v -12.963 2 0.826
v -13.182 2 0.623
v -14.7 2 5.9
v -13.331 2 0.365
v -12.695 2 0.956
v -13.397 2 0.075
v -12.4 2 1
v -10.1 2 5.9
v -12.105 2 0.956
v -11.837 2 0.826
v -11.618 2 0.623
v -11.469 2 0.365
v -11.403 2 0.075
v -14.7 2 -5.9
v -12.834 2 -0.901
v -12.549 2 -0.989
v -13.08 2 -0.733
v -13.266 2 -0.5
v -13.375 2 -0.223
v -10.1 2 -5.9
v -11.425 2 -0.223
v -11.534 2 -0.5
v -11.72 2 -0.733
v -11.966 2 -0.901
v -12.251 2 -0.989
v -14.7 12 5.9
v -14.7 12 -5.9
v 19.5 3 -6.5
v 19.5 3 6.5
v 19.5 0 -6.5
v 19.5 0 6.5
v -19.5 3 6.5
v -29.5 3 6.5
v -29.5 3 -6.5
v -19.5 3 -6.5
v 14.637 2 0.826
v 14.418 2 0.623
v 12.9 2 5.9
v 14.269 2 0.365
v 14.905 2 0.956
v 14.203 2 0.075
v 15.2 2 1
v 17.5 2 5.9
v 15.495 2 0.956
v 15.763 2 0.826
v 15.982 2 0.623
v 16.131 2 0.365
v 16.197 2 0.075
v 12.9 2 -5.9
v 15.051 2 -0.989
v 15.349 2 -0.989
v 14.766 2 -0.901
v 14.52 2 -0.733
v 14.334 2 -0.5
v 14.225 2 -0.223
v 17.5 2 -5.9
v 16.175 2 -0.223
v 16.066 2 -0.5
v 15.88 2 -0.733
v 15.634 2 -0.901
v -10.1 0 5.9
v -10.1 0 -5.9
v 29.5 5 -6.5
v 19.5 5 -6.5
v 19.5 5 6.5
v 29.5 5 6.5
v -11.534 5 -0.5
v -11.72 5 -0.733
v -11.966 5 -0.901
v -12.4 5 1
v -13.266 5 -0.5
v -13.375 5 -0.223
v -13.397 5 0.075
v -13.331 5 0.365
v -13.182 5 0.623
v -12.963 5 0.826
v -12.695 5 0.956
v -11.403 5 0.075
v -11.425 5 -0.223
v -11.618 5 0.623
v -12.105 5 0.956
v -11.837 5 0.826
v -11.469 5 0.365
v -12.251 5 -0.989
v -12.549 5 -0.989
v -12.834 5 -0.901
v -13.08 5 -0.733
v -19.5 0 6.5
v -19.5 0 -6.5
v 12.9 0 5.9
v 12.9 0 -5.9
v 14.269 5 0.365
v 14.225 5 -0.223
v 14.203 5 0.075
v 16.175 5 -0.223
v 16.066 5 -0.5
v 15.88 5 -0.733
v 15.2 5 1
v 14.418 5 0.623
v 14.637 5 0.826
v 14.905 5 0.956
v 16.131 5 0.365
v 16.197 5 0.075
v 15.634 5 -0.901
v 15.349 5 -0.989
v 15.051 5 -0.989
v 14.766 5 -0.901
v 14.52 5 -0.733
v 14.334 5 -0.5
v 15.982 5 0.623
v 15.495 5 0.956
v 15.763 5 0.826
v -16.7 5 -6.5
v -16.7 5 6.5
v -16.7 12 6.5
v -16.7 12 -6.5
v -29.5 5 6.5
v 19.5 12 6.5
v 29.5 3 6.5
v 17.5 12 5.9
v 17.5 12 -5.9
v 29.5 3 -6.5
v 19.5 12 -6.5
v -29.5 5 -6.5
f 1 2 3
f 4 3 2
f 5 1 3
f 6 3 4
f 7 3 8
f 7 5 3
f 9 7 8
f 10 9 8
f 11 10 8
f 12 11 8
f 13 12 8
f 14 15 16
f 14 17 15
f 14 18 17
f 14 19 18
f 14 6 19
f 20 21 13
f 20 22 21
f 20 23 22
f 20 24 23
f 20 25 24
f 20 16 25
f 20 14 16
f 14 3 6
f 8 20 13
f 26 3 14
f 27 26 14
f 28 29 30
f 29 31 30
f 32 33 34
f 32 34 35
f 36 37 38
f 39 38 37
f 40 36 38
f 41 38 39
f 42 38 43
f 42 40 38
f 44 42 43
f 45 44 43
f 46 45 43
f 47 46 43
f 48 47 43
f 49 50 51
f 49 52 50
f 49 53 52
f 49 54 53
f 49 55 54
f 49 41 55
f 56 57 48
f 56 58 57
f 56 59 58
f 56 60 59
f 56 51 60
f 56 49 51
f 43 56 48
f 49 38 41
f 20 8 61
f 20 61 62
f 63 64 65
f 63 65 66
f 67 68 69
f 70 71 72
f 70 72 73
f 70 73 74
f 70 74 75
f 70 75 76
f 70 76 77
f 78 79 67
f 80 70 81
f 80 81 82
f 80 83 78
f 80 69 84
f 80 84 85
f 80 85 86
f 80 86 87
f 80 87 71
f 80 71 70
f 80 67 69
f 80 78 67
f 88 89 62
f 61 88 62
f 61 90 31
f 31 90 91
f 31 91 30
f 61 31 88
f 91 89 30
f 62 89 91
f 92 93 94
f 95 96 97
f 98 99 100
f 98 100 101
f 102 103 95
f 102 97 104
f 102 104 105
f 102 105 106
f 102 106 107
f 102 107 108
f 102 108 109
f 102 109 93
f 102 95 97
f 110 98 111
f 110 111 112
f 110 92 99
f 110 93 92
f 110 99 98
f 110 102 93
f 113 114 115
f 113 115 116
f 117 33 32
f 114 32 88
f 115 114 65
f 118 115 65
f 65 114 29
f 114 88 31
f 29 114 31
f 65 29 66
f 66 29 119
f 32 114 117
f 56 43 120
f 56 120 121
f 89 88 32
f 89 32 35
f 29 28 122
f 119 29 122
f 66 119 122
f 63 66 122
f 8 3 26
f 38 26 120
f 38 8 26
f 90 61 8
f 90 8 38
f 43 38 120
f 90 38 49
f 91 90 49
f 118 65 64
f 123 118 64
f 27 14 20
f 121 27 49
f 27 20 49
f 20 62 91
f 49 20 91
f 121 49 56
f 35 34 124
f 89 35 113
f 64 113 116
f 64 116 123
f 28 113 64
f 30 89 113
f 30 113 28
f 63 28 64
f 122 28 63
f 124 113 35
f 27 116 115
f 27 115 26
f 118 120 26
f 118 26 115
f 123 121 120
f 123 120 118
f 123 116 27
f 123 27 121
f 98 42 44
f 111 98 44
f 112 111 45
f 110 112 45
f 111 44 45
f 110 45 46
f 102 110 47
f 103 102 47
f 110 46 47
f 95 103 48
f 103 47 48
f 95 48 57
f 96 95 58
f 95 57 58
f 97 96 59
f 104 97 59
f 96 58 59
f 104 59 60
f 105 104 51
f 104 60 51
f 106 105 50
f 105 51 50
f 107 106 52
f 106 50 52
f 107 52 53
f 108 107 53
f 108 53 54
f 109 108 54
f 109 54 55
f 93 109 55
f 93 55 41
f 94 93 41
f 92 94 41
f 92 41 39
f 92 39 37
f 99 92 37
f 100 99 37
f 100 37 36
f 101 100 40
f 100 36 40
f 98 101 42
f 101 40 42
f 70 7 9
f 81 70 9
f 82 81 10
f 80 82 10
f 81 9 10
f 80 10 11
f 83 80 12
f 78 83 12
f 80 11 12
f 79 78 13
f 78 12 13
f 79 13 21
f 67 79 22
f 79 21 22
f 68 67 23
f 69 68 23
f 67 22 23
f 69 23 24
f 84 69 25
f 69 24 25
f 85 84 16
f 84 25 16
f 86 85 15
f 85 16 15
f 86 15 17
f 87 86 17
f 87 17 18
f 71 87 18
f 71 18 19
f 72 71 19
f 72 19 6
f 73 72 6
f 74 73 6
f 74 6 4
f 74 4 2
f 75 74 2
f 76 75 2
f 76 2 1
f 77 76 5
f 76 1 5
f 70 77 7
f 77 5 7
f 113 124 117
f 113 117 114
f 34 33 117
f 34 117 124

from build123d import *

# Parameters (mm, degrees)
SKETCH1_W           = 39
SKETCH1_H           = 13
BOSS_EXTRUDE1_DEPTH = 2
SKETCH3_W           = 2
SKETCH3_H           = 13
SKETCH3_W_2         = 4.8
BOSS_EXTRUDE2_DEPTH = 1
SKETCH4_W           = 14.8
SKETCH4_H           = 13
SKETCH4_W_2         = 12
BOSS_EXTRUDE3_DEPTH = 2
SKETCH5_W           = 23
SKETCH5_H           = 11.8
CUT_EXTRUDE1_DEPTH  = 31.356218473
SKETCH6_R           = 1
BOSS_EXTRUDE4_DEPTH = 3
SKETCH7_W           = 32.2
SKETCH7_H           = 0.6
BOSS_EXTRUDE5_DEPTH = 10
SKETCH8_W           = 2
SKETCH8_H           = 13
BOSS_EXTRUDE6_DEPTH = 7


with BuildPart() as part:
    # Sketch1 → Boss-Extrude1 (new body)
    with BuildSketch(Plane(origin=(0, 0, 0), x_dir=(1, 0, 0), z_dir=(0, 1, 0))):
        Rectangle(SKETCH1_W, SKETCH1_H)
    extrude(amount=BOSS_EXTRUDE1_DEPTH)

    # Sketch3 → Boss-Extrude2 (add)
    with BuildSketch(Plane(origin=(0, 2, 0), x_dir=(1, 0, 0), z_dir=(0, 1, 0))):
        with Locations((18.5, 0)):
            Rectangle(SKETCH3_W, SKETCH3_H)
        with Locations((-17.1, 0)):
            Rectangle(SKETCH3_W_2, SKETCH3_H)
    extrude(amount=BOSS_EXTRUDE2_DEPTH)

    # Sketch4 → Boss-Extrude3 (add)
    with BuildSketch(Plane(origin=(0, 3, 0), x_dir=(1, 0, 0), z_dir=(0, 1, 0))):
        with Locations((-22.1, 0)):
            Rectangle(SKETCH4_W, SKETCH4_H)
        with Locations((23.5, 0)):
            Rectangle(SKETCH4_W_2, SKETCH4_H)
    extrude(amount=BOSS_EXTRUDE3_DEPTH)

    # Sketch5 → Cut-Extrude1 (cut, through all)
    with BuildSketch(Plane(origin=(0, 2, 0), x_dir=(1, 0, 0), z_dir=(0, 1, 0))):
        with Locations((1.4, 0)):
            Rectangle(SKETCH5_W, SKETCH5_H)
    extrude(amount=-CUT_EXTRUDE1_DEPTH, mode=Mode.SUBTRACT)

    # Sketch6 → Boss-Extrude4 (add)
    with BuildSketch(Plane(origin=(0, 2, 0), x_dir=(1, 0, 0), z_dir=(0, 1, 0))):
        with Locations(Location((-12.4, 0, 0), (0, 0, 270))):
            Circle(SKETCH6_R)
        with Locations(Location((15.2, 0, 0), (0, 0, 270))):
            Circle(SKETCH6_R)
    extrude(amount=BOSS_EXTRUDE4_DEPTH)

    # Sketch7 → Boss-Extrude5 (add)
    with BuildSketch(Plane(origin=(0, 2, 0), x_dir=(1, 0, 0), z_dir=(0, 1, 0))):
        with Locations((1.4, -6.2)):
            Rectangle(SKETCH7_W, SKETCH7_H)
        with Locations((1.4, 6.2)):
            Rectangle(SKETCH7_W, SKETCH7_H)
    extrude(amount=BOSS_EXTRUDE5_DEPTH)

    # Sketch8 → Boss-Extrude6 (add)
    with BuildSketch(Plane(origin=(0, 5, 0), x_dir=(1, 0, 0), z_dir=(0, 1, 0))):
        with Locations((-15.7, 0)):
            Rectangle(SKETCH8_W, SKETCH8_H)
        with Locations((18.5, 0)):
            Rectangle(SKETCH8_W, SKETCH8_H)
    extrude(amount=BOSS_EXTRUDE6_DEPTH)


solid = part.part
